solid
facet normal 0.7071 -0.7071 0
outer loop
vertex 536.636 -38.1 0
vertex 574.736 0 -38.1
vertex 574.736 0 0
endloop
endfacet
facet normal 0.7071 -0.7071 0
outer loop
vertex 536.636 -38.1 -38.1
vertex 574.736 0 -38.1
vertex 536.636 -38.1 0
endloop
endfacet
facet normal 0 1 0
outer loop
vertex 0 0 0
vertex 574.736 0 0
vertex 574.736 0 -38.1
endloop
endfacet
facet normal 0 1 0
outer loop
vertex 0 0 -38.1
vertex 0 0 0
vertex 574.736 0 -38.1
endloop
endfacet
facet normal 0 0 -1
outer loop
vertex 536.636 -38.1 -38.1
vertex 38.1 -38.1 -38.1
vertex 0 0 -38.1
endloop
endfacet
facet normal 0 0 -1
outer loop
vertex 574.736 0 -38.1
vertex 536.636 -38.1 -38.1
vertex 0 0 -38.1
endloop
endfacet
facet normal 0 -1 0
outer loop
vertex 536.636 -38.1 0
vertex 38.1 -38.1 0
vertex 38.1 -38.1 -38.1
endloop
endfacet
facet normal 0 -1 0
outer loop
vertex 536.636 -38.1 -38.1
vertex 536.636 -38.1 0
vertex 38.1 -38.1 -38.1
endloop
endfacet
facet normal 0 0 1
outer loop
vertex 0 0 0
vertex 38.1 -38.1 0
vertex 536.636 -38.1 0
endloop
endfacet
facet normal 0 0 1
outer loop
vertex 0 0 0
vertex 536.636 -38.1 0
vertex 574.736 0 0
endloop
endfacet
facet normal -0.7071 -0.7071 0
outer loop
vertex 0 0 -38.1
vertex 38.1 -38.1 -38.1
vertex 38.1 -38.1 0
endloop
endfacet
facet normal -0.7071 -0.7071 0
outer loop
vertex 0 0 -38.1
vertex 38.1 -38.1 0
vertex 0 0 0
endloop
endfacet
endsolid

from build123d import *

# Parameters (mm, degrees)
SKETCH1_W               = 38.1
SKETCH1_H               = 38.1
BOSS_EXTRUDE1_DEPTH     = 574.7363918
CUT_EXTRUDE1_DEPTH      = 578.256563461
CUT_EXTRUDE1_DEPTH_BACK = 578.256563461
CUT_EXTRUDE2_DEPTH      = 578.256563461
CUT_EXTRUDE2_DEPTH_BACK = 578.256563461


with BuildPart() as part:
    # Sketch1 → Boss-Extrude1 (new body)
    with BuildSketch(Plane(origin=(0, 0, 0), x_dir=(0, 0, -1), z_dir=(1, 0, 0))):
        with Locations((19.05, -19.05)):
            Rectangle(SKETCH1_W, SKETCH1_H)
    extrude(amount=BOSS_EXTRUDE1_DEPTH)

    # Sketch2 → Cut-Extrude1 (cut, two sides: drawn at the far end of the back side and taken through both)
    with BuildSketch(Plane.XY.offset(-CUT_EXTRUDE1_DEPTH_BACK)):
        Polygon((-1161.9957119, -38.1), (0, -38.1), (38.1, -38.1), (0, 0), (-821.655047595, 821.655047595), (-2982.499615844, 1677.042030058), (-3322.84028015, 817.286982464), align=None)
    extrude(amount=CUT_EXTRUDE1_DEPTH + CUT_EXTRUDE1_DEPTH_BACK, mode=Mode.SUBTRACT)

    # Sketch3 → Cut-Extrude2 (cut, two sides: drawn at the far end of the back side and taken through both)
    with BuildSketch(Plane.XY.offset(-CUT_EXTRUDE2_DEPTH_BACK)):
        Polygon((1736.7321037, -38.1), (574.7363918, -38.1), (536.6363918, -38.1), (574.7363918, 0), (1396.391439395, 821.655047595), (3557.236007644, 1677.042030058), (3897.57667195, 817.286982464), align=None)
    extrude(amount=CUT_EXTRUDE2_DEPTH + CUT_EXTRUDE2_DEPTH_BACK, mode=Mode.SUBTRACT)


solid = part.part
